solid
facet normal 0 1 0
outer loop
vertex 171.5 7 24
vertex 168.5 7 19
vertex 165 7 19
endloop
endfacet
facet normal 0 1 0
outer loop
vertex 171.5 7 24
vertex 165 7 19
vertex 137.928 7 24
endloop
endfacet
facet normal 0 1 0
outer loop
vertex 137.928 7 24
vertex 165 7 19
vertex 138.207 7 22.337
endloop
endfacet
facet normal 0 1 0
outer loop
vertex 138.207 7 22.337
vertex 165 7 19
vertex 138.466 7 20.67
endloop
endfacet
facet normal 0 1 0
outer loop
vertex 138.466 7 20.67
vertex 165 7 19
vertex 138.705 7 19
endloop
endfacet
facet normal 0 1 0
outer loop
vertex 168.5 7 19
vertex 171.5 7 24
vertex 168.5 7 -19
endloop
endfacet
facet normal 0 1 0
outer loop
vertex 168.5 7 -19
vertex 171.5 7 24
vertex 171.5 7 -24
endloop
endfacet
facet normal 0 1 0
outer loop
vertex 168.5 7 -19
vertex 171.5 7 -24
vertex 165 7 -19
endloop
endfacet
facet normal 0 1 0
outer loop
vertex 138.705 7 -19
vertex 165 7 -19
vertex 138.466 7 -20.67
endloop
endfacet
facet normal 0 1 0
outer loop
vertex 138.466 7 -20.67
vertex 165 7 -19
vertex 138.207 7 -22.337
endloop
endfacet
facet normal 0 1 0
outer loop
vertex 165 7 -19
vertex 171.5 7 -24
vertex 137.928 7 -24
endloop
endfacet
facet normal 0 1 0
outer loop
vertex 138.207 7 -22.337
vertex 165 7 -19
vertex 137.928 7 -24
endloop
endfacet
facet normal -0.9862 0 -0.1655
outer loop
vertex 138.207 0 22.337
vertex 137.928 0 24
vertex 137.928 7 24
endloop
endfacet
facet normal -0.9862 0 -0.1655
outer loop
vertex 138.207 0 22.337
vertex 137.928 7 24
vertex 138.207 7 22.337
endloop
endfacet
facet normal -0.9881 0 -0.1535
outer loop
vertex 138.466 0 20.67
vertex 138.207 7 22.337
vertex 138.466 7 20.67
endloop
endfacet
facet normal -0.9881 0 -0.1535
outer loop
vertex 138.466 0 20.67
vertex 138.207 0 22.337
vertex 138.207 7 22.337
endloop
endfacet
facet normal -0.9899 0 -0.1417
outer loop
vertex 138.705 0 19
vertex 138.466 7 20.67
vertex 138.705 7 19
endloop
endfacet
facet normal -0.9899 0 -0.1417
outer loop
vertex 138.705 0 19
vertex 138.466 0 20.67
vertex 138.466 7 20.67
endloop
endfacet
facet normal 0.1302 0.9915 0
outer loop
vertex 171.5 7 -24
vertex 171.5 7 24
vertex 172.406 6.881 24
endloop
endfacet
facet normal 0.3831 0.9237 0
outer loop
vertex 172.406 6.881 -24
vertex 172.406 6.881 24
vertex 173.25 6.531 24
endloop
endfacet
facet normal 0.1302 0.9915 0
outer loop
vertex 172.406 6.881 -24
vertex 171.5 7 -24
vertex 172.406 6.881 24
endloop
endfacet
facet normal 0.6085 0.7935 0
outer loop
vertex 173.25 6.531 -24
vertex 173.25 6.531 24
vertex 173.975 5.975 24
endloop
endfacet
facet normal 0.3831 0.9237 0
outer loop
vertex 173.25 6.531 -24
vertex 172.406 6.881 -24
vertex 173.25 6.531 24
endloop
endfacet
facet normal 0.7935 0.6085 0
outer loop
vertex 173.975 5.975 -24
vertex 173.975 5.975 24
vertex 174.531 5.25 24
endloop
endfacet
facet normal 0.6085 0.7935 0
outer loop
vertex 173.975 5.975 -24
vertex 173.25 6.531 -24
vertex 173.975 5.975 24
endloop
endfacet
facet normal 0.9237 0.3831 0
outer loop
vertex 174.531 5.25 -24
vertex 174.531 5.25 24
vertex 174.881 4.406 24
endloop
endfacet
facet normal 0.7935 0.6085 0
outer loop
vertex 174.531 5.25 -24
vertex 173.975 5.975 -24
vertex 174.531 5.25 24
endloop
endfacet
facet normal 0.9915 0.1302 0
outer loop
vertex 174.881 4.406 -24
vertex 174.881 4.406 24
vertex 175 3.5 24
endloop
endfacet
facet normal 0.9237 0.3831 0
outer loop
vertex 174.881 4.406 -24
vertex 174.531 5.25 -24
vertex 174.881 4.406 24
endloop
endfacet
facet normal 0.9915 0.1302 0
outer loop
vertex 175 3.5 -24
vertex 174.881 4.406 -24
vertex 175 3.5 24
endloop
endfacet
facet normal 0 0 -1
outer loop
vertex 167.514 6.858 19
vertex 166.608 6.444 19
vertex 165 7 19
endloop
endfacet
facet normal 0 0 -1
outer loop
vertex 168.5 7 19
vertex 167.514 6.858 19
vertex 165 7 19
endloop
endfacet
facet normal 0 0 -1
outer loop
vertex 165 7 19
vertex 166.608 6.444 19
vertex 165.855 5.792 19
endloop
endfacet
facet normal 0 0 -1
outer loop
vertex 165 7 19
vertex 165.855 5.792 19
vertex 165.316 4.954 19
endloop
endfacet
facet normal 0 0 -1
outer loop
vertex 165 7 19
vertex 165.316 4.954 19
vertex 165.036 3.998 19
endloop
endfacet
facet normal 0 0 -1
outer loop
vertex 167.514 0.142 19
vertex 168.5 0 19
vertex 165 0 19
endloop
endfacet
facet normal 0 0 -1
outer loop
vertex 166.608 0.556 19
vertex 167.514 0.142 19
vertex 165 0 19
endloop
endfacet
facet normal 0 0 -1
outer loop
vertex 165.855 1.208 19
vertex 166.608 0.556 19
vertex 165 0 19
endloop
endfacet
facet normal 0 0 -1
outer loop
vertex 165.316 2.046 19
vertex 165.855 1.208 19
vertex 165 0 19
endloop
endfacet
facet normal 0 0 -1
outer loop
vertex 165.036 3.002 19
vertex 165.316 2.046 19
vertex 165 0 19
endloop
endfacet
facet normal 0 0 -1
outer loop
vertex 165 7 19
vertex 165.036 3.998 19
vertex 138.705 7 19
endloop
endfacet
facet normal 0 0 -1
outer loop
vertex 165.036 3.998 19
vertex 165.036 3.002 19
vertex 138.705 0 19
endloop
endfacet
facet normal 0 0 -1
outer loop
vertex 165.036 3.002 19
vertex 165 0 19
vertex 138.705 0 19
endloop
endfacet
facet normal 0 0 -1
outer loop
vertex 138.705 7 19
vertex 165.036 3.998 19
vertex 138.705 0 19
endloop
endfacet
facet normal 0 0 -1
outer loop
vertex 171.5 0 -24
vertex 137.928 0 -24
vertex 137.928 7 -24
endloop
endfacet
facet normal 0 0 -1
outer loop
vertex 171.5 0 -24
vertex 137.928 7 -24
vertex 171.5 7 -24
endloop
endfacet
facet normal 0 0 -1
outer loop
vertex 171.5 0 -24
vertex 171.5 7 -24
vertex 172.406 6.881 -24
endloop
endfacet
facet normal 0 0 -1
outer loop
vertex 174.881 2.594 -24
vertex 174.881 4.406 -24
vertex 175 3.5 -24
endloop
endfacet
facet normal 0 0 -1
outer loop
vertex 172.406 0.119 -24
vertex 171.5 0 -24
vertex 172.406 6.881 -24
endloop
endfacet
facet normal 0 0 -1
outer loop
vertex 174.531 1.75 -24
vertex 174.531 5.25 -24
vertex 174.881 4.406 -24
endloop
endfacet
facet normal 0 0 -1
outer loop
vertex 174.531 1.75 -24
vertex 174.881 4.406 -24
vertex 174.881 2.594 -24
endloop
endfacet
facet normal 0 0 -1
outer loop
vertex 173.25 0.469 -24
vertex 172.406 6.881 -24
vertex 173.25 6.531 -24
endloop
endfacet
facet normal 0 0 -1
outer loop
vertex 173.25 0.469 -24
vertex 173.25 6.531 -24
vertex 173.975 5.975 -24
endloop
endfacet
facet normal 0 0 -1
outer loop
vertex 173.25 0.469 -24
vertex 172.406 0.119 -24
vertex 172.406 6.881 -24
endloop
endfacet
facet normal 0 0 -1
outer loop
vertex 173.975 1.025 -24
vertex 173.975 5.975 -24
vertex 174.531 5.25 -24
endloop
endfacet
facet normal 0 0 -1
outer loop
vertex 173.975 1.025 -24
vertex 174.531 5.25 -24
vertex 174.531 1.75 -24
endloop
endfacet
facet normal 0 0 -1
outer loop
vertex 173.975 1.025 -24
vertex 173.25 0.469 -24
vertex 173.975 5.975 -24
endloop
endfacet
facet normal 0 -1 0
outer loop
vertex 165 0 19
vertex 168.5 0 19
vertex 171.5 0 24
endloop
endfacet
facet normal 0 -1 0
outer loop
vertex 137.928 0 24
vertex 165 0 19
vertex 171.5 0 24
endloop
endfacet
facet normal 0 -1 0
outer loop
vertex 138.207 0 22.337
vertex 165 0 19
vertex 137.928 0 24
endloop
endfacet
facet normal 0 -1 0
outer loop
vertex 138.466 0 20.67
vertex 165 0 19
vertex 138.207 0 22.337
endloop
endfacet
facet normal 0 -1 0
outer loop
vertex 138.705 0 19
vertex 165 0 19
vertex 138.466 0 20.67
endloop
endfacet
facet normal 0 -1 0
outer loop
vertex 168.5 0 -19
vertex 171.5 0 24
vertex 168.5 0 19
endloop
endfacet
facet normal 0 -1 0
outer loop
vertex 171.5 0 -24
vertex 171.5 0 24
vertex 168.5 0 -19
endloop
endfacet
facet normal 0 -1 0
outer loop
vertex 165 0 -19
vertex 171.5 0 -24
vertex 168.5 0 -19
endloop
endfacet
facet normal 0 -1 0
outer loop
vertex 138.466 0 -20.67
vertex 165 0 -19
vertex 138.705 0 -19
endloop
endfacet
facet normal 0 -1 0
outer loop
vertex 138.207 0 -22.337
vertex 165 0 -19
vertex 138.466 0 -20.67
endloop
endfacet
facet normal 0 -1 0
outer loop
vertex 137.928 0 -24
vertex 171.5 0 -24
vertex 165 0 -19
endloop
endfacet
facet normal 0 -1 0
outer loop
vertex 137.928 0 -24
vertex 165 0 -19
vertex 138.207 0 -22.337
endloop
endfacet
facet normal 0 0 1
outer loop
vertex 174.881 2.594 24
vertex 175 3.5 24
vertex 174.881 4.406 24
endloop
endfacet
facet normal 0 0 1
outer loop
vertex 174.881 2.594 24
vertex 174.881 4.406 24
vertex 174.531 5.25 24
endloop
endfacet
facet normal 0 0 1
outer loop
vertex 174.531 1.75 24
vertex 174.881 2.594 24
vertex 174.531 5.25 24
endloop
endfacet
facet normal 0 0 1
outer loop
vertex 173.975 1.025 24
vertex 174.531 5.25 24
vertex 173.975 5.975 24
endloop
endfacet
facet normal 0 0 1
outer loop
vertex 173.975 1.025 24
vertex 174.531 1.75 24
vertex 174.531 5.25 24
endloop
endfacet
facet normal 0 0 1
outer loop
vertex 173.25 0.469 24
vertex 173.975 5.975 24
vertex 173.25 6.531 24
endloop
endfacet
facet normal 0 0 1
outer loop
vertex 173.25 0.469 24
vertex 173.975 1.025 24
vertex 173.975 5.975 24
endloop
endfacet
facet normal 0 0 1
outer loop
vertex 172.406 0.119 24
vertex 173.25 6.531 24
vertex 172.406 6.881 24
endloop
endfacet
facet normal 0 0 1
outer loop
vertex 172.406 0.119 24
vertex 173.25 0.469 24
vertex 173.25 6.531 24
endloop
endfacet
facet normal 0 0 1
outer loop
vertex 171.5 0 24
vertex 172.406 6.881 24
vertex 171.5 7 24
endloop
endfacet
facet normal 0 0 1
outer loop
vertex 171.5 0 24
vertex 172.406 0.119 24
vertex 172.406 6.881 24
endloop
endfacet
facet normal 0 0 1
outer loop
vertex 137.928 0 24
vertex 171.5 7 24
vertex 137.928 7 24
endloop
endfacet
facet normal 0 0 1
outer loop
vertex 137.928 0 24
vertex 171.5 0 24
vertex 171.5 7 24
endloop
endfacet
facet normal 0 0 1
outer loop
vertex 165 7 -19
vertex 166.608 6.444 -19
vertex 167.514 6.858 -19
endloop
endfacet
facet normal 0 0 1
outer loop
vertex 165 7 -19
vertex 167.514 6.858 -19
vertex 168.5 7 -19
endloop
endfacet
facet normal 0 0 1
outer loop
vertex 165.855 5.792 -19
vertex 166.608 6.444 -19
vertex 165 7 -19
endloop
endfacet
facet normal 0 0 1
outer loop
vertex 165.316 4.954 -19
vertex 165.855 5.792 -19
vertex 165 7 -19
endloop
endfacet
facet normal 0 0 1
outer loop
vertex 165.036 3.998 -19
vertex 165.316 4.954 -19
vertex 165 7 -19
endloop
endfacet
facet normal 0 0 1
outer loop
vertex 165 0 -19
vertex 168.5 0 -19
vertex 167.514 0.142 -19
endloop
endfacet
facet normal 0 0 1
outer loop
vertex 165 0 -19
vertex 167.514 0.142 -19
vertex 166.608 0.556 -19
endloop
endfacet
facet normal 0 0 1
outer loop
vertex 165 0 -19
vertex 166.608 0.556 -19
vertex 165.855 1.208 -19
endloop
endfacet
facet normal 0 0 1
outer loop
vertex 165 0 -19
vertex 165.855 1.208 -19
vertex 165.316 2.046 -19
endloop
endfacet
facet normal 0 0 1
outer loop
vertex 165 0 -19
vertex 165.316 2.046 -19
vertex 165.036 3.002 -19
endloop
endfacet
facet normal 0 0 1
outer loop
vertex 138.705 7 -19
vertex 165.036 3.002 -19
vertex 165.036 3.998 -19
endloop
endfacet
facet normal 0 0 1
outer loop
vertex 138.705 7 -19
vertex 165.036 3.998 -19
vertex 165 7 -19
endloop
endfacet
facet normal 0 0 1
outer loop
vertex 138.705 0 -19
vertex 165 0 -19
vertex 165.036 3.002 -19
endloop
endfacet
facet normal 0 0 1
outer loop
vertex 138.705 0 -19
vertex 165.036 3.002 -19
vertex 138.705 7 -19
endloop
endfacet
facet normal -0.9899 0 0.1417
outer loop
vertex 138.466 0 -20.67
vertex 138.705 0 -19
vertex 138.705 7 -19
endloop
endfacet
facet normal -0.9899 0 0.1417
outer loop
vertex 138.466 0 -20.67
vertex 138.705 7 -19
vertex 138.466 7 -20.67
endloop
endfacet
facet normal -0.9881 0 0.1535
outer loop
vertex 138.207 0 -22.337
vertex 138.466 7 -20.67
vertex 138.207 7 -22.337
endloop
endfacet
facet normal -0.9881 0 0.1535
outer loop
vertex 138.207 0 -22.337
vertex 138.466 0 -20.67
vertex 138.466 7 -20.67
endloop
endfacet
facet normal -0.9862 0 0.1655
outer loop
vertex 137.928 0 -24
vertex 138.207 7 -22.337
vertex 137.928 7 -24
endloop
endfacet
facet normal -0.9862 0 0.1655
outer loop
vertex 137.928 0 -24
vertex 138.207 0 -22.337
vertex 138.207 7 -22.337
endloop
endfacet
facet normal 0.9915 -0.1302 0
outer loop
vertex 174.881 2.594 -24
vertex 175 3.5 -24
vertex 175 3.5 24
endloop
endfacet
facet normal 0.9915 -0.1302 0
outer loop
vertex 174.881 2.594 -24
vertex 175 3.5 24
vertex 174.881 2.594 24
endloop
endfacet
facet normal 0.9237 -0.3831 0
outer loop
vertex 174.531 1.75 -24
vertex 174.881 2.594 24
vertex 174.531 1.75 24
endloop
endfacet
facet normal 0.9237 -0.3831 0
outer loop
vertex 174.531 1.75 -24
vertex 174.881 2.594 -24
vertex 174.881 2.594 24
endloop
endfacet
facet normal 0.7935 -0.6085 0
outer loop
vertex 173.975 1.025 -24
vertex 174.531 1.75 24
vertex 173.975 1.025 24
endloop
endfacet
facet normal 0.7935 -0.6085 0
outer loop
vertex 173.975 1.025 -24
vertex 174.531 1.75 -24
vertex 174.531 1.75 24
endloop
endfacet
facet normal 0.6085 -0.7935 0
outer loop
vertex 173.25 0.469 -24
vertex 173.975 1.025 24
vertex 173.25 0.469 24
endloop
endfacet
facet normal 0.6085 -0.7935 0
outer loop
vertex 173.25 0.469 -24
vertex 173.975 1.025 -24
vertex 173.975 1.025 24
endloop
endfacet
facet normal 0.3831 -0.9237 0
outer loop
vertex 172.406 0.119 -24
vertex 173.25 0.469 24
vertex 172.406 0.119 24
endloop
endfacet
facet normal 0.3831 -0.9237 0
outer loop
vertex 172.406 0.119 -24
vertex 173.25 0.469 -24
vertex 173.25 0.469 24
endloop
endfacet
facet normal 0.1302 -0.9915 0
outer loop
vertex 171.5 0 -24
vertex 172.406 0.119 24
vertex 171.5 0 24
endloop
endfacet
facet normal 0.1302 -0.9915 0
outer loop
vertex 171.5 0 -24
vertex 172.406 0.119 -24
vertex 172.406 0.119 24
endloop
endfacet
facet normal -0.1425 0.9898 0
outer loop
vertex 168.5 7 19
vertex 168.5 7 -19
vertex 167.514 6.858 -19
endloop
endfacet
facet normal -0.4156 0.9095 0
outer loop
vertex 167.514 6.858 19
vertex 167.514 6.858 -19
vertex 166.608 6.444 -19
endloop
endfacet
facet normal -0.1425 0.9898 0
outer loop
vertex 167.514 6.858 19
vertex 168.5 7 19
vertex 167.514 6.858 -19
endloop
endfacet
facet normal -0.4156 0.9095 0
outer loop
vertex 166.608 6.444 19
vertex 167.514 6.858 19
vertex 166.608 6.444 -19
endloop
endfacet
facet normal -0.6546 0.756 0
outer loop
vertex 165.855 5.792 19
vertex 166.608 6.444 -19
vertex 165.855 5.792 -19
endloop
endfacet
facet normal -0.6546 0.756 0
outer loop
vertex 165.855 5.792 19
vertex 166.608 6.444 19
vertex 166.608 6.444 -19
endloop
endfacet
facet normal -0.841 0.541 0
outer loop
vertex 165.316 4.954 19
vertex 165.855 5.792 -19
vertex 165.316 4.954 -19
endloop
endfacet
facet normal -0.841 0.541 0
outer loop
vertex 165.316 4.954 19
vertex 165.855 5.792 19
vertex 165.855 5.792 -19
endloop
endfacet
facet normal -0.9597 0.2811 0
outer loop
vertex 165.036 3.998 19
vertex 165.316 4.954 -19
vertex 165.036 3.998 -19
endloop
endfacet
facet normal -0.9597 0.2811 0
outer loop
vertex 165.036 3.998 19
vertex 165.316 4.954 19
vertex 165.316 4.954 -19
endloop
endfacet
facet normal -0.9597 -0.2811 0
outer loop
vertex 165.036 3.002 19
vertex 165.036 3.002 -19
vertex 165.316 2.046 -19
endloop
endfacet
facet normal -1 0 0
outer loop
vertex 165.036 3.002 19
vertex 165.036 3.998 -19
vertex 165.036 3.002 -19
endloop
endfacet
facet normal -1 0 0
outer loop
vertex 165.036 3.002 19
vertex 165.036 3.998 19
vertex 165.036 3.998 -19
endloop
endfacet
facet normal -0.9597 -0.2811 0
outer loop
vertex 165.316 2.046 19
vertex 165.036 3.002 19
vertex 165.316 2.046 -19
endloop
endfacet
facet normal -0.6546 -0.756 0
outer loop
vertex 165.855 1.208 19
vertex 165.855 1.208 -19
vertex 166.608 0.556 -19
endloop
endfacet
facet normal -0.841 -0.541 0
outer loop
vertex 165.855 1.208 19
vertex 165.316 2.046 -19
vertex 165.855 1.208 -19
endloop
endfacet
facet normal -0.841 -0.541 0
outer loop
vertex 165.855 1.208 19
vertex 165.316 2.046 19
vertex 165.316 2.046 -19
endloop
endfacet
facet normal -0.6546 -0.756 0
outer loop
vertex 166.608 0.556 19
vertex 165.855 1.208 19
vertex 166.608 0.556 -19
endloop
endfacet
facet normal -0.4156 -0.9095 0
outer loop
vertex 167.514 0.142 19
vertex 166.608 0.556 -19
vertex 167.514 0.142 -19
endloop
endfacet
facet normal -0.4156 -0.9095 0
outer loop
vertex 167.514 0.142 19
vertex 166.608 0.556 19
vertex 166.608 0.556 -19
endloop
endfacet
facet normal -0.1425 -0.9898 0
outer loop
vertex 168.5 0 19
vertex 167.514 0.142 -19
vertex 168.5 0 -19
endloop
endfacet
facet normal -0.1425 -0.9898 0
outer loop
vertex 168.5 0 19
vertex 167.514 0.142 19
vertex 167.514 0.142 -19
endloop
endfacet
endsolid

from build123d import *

# Parameters (mm, degrees)
BOSS_EXTRUDE1_DEPTH = 7
FILLET1_START       = -25
FILLET1_DEPTH       = 50
FILLET2_RADIUS      = 3.5
FILLET2_LENGTH      = 38.000003375


with BuildPart() as part:
    # Sketch1 → Boss-Extrude1 (new body)
    with BuildSketch(Plane(origin=(0, 0, 0), x_dir=(1, 0, 0), z_dir=(0, 1, 0))):
        with BuildLine():
            Line((137.927515414, 24.000010242), (175, 24.000010242))
            Line((175, 24.000010242), (175, -24))
            Line((175, -24), (137.927515472, -24.000009912))
            ThreePointArc((137.927515472, -24.000009912), (138.338710325, -21.50351659), (138.704722342, -19))
            Line((138.704722342, -19), (165, -19))
            Line((165, -19), (165, 19.000003375))
            Line((165, 19.000003375), (138.70472188, 19.000003375))
            ThreePointArc((138.70472188, 19.000003375), (138.338710037, 21.503518438), (137.927515414, 24.000010242))
        make_face()
    extrude(amount=BOSS_EXTRUDE1_DEPTH)

    # Fillet1: read off the stored shape, not the designer's step
    # Fillet1 outline → Fillet1 (cut)
    with BuildSketch(Plane.XY.offset(FILLET1_START)):
        with BuildLine():
            ThreePointArc((171.5, 7), (173.974873734, 5.974873734), (175, 3.5))
            Line((175, 3.5), (175, 7))
            Line((175, 7), (171.5, 7))
        make_face()
        with BuildLine():
            ThreePointArc((175, 3.5), (173.974873734, 1.025126266), (171.5, 0))
            Line((171.5, 0), (175, 0))
            Line((175, 0), (175, 3.5))
        make_face()
    extrude(amount=FILLET1_DEPTH, mode=Mode.SUBTRACT)

    # Fillet2: full round fillet: the end face becomes a half cylinder, R = half its width
    fillet2_face = Plane((165, 3.5, -1.687e-06), x_dir=(0, 0, 1), z_dir=(-1, 0, 0))  # on the end face: x along it, z out of the body
    fillet2_slab = fillet2_face.offset(-FILLET2_RADIUS / 2) * Box(FILLET2_LENGTH, 2 * FILLET2_RADIUS, FILLET2_RADIUS, mode=Mode.PRIVATE)  # the body's end, R deep
    fillet2_round = Plane((168.5, 3.5, -1.687e-06), x_dir=(-1, 0, 0), z_dir=(0, 0, 1)) * Cylinder(FILLET2_RADIUS, FILLET2_LENGTH, mode=Mode.PRIVATE)  # its axis R under the face
    add(fillet2_slab - fillet2_round, mode=Mode.SUBTRACT)


solid = part.part
